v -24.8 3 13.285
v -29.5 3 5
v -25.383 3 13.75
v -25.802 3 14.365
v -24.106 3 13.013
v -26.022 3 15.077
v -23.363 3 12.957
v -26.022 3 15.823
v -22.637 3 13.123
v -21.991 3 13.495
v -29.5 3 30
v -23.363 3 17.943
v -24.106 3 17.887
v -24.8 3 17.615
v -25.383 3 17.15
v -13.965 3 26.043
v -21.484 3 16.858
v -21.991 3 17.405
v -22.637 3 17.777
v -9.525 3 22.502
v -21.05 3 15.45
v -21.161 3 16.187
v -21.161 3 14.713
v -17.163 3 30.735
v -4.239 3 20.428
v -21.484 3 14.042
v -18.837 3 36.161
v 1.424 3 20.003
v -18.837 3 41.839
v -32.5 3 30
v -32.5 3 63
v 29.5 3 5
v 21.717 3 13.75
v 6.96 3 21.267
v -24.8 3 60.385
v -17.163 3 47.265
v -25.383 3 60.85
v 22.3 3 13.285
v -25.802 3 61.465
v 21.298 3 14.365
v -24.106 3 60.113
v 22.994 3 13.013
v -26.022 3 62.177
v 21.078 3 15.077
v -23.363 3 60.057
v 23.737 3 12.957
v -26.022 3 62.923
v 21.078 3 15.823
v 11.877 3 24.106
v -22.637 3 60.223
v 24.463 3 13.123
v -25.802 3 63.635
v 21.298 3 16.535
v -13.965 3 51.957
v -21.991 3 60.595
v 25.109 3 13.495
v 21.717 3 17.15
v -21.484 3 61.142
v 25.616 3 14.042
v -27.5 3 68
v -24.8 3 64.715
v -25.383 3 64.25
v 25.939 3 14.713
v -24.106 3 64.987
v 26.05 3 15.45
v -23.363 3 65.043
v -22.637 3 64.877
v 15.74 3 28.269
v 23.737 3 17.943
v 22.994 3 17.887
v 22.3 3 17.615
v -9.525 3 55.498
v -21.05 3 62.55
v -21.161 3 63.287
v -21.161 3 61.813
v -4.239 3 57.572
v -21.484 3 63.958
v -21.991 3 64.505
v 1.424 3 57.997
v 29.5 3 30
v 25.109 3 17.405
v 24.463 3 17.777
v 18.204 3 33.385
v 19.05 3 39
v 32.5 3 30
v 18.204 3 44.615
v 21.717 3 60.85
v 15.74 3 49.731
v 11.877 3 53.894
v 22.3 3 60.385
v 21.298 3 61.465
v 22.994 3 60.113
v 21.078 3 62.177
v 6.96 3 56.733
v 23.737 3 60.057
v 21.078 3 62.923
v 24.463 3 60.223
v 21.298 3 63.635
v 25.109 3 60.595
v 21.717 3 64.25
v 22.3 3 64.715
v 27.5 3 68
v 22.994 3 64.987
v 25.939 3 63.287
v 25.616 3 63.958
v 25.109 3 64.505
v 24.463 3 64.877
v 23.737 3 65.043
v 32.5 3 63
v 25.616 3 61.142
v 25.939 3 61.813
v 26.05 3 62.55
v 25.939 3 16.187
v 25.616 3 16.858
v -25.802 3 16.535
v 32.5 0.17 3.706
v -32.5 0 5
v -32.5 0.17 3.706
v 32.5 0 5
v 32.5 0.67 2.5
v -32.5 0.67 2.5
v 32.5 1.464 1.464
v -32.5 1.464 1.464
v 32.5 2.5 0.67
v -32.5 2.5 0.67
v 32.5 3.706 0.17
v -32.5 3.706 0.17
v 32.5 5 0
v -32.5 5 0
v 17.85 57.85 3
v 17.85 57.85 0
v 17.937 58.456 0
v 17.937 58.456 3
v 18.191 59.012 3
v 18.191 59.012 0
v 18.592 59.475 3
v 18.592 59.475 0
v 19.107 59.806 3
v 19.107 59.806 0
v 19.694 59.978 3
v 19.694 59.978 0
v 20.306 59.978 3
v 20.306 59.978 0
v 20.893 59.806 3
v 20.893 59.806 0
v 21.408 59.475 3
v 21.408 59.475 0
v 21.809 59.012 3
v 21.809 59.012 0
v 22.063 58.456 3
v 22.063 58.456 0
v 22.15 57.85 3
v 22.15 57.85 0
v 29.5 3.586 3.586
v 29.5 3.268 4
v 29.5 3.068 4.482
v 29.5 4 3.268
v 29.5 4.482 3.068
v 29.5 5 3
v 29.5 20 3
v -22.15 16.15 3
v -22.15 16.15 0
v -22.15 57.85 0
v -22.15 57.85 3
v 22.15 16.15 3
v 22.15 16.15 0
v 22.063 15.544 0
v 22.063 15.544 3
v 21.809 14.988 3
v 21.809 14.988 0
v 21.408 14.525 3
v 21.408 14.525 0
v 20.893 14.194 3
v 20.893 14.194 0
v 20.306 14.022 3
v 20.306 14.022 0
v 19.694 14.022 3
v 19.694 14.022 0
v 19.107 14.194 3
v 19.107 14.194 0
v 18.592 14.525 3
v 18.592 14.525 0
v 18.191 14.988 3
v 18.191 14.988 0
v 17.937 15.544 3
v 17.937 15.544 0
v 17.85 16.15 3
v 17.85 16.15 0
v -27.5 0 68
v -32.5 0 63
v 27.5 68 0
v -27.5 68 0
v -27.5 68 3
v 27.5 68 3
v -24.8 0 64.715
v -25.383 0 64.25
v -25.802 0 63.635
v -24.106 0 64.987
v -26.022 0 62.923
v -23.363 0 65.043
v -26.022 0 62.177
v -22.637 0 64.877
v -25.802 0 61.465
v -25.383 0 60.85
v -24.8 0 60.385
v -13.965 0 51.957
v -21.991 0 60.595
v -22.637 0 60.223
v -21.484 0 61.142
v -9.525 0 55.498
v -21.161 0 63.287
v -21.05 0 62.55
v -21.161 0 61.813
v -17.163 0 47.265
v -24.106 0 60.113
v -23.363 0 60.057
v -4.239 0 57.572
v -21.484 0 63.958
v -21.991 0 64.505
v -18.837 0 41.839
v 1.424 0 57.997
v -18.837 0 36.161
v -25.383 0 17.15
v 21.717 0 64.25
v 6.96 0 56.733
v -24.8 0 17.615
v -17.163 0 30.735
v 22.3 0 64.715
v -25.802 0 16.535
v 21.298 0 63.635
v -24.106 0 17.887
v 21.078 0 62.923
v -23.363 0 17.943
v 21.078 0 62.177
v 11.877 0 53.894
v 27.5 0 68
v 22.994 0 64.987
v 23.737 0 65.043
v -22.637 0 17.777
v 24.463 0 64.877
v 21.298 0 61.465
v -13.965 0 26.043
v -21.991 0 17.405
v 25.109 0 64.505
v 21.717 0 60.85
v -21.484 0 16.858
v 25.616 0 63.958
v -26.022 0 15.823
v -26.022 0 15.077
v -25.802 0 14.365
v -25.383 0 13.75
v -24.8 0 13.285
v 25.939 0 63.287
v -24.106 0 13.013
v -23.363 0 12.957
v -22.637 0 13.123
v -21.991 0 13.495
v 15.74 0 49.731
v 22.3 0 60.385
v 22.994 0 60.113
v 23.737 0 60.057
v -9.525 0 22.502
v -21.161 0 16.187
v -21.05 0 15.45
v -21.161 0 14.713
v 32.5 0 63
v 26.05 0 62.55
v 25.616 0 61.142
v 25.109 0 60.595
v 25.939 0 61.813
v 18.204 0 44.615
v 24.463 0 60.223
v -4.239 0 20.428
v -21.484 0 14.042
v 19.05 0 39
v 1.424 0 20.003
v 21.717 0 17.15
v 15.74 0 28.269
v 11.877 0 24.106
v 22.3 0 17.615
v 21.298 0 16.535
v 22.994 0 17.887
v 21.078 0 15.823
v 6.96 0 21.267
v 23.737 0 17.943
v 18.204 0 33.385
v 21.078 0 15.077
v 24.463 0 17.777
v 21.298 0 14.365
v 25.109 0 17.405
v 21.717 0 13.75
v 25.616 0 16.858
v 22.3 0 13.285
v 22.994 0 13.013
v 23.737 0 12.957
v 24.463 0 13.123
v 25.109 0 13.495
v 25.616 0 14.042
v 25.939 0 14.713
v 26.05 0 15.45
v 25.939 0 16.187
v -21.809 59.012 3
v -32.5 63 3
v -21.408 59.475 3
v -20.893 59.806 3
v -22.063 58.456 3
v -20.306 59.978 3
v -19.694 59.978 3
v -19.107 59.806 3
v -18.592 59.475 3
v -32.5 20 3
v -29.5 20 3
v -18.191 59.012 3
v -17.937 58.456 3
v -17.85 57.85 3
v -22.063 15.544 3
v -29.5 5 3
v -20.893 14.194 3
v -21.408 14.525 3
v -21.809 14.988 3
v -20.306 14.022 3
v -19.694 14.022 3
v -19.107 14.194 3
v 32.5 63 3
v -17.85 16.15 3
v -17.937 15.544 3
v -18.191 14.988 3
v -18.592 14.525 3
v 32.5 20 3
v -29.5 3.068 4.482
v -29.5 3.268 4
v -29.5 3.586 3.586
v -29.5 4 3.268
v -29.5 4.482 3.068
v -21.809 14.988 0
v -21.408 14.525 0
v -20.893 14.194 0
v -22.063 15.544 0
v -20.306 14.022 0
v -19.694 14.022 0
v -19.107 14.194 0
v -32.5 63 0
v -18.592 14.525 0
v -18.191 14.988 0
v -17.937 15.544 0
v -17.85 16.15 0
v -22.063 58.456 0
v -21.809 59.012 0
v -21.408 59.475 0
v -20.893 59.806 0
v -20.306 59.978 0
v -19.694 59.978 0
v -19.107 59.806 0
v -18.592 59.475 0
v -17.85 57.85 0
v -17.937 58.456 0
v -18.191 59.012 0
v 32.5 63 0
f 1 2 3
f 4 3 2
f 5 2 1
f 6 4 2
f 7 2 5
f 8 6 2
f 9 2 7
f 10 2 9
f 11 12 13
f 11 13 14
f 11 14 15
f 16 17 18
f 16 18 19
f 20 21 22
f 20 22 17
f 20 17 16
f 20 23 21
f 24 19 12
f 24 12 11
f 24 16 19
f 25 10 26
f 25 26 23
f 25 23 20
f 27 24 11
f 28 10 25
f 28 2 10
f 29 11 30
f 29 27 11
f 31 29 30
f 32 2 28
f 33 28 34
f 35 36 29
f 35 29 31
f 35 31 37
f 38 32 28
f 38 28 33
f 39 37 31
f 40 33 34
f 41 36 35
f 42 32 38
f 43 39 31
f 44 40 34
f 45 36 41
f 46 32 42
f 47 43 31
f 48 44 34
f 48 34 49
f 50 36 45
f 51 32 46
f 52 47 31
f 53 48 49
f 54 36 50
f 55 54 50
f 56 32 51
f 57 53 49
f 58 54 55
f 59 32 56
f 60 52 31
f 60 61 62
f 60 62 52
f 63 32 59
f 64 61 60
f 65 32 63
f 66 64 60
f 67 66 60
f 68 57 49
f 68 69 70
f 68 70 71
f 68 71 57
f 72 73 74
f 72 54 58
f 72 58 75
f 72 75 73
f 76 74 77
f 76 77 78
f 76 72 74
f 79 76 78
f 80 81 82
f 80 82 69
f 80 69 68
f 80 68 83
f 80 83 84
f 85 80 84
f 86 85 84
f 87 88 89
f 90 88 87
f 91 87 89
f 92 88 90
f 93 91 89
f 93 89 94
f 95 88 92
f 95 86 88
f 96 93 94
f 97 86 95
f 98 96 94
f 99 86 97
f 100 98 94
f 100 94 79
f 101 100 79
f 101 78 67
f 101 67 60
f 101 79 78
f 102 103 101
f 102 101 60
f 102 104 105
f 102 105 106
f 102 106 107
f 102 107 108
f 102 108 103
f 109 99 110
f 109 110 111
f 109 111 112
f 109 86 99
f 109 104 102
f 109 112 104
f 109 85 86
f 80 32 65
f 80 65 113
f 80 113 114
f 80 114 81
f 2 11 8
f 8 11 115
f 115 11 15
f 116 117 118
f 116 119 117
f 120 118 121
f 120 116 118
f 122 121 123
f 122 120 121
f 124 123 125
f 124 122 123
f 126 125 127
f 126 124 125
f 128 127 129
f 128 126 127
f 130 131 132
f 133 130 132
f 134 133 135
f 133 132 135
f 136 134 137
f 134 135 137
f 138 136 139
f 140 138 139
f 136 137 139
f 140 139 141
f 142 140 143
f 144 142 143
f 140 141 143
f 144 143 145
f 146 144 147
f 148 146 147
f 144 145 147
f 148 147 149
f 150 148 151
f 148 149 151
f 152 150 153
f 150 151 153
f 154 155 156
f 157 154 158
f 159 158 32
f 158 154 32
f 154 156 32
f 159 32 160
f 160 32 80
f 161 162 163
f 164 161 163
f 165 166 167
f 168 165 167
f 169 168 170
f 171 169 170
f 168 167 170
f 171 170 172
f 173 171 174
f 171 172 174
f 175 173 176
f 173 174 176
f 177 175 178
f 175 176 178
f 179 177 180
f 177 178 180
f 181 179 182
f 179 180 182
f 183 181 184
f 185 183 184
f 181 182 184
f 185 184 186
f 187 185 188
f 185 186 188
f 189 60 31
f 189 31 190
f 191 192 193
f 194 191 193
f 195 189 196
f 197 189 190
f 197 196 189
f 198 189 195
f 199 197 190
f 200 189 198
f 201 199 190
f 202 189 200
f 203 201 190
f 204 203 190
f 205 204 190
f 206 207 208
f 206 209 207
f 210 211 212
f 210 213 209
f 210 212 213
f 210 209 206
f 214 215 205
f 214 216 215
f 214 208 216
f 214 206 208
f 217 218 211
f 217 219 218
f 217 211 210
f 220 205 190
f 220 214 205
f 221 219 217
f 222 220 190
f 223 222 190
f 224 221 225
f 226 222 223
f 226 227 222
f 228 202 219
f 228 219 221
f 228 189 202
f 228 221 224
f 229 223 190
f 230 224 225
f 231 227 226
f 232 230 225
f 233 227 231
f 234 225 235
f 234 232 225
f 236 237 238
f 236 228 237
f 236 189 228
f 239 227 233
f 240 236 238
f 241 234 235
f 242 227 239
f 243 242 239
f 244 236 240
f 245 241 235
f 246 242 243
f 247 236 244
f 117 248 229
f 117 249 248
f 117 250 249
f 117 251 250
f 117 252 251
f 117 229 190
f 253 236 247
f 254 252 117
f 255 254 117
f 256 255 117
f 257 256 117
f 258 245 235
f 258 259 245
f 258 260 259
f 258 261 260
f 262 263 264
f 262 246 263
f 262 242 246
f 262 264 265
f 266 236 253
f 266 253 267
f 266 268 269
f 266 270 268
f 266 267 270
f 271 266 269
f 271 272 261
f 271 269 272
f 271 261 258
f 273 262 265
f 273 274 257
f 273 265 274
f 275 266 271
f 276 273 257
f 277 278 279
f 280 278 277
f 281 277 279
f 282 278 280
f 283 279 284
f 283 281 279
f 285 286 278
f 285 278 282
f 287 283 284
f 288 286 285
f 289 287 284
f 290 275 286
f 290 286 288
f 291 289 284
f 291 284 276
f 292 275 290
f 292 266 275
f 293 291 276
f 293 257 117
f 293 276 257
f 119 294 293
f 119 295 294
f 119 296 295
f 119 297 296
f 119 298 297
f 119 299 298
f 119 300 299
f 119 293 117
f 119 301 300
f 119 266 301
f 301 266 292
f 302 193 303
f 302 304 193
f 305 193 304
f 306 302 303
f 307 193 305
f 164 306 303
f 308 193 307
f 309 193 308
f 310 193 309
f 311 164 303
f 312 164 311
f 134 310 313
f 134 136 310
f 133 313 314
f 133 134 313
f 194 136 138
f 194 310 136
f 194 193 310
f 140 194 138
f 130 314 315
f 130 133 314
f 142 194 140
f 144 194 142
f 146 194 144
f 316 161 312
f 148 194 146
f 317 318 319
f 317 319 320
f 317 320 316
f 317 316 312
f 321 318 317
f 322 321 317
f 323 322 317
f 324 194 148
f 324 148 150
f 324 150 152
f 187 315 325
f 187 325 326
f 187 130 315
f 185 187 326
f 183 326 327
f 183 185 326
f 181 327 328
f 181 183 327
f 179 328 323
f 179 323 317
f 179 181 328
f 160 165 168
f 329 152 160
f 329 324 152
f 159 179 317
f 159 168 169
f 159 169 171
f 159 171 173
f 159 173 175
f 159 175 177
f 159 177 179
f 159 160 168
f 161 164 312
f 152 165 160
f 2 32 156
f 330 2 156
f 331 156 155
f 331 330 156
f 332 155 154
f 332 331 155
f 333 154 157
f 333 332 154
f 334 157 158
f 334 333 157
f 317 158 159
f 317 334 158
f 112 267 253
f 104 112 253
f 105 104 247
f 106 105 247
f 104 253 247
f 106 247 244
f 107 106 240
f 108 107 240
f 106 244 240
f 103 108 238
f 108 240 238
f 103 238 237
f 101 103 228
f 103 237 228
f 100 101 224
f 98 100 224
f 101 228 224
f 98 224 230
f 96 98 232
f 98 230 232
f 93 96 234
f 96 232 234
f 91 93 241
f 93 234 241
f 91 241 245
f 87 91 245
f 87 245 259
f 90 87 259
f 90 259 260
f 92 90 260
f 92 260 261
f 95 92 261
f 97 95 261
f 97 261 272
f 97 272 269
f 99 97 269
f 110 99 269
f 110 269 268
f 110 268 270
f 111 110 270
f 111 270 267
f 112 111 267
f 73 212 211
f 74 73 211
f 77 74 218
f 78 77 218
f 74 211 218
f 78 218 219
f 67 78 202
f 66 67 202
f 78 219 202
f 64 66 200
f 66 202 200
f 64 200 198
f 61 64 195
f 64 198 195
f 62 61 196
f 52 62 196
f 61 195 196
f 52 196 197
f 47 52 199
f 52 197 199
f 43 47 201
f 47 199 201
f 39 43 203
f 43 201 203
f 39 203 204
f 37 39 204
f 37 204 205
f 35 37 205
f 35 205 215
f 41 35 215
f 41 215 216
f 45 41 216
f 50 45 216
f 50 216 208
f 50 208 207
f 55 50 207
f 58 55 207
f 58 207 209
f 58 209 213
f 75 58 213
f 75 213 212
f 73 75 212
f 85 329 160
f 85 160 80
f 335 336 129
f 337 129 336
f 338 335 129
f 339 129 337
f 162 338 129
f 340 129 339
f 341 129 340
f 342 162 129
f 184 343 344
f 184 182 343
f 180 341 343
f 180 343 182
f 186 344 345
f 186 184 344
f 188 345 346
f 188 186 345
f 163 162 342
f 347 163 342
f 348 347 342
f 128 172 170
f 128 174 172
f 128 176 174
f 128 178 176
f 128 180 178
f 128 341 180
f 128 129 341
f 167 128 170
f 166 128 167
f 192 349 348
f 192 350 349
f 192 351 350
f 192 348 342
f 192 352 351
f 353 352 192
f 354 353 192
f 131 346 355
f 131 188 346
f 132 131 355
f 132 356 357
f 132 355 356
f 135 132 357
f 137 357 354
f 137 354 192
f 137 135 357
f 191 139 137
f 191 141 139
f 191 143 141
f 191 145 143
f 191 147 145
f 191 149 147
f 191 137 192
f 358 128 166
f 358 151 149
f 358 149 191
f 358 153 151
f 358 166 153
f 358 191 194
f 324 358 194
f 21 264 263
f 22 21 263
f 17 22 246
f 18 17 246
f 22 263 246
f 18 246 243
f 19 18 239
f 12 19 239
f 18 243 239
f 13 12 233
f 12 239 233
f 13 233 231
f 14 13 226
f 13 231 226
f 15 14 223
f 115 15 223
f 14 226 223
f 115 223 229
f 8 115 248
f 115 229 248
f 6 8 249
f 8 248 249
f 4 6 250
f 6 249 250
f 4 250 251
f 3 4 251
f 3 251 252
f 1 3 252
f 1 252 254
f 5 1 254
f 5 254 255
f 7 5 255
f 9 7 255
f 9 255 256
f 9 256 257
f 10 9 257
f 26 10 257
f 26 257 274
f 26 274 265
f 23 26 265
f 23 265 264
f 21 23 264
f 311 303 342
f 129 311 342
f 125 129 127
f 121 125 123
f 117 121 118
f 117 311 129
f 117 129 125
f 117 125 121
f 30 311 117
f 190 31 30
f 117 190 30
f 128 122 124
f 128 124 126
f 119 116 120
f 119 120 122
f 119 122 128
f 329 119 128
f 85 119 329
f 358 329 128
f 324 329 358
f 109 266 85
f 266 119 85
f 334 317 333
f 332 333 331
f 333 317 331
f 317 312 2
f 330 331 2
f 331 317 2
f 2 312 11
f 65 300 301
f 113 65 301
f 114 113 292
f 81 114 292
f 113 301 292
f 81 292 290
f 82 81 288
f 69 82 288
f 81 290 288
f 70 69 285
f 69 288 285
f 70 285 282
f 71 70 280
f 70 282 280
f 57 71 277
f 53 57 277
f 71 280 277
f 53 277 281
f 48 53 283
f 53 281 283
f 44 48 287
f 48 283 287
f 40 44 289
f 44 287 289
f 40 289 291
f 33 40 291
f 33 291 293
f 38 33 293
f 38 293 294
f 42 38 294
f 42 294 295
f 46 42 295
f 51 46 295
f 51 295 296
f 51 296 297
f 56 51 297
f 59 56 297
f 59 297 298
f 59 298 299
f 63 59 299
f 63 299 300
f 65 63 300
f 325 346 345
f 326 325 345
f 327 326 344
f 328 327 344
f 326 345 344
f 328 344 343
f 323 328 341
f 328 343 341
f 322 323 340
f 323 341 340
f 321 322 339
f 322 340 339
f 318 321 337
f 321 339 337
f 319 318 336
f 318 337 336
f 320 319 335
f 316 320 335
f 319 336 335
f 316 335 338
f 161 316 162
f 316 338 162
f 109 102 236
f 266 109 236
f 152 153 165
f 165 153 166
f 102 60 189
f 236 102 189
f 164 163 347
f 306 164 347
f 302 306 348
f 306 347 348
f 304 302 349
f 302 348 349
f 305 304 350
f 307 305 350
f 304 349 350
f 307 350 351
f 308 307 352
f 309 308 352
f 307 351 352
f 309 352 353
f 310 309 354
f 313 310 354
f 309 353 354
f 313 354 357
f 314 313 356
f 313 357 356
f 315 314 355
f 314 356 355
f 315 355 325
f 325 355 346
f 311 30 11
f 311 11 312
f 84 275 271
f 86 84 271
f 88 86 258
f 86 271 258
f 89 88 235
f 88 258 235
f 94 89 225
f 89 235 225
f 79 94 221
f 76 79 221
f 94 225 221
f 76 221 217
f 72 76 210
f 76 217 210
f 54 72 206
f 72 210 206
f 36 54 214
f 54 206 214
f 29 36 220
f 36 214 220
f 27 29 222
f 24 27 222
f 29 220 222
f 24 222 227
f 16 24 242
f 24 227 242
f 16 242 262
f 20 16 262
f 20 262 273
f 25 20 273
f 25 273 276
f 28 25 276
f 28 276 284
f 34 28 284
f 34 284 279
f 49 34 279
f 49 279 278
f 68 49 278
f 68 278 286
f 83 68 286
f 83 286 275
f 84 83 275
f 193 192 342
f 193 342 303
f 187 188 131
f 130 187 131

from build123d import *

# Parameters (mm, degrees)
F1_DEPTH  = 32.5
F2_R      = 5
F3_R      = 2
F4_R      = 19.05
F4_R_2    = 2.5
F5_DEPTH  = 68.001
F7_DEPTH  = 68.001
F9_DEPTH  = 3
F11_DEPTH = 3
F12_SIZE  = 5


with BuildPart() as f1:
    # F0 (on Right) → F1 (new body, symmetric)
    with BuildSketch(Plane.YZ):
        Polygon((0, 68), (0, 0), (68, 0), (68, 3), (3, 3), (3, 68), align=None)
    extrude(amount=F1_DEPTH, both=True)

    # F2
    f2_edges = [f1.edges().sort_by_distance(p)[0] for p in [
        (0, 0, 0),
    ]]
    fillet(f2_edges, radius=F2_R)

    # F3
    f3_edges = [f1.edges().sort_by_distance(p)[0] for p in [
        (0, 3, 3),
    ]]
    fillet(f3_edges, radius=F3_R)

    # F4 (on face) → F5 (cut, through all)
    with BuildSketch(Plane.XZ):
        with Locations((0, 39)):
            Circle(F4_R)
        with Locations((-23.55, 15.45)):
            Circle(F4_R_2)
        with Locations((23.55, 15.45)):
            Circle(F4_R_2)
        with Locations((23.55, 62.55)):
            Circle(F4_R_2)
        with Locations((-23.55, 62.55)):
            Circle(F4_R_2)
    extrude(amount=-F5_DEPTH, mode=Mode.SUBTRACT)

    # F6 (on face) → F7 (cut, through all)
    with BuildSketch(Plane(origin=(0, 0, 0), x_dir=(1, 0, 0), z_dir=(0, 0, -1))):
        with BuildLine():
            ThreePointArc((-22.15, -57.85), (-20, -60), (-17.85, -57.85))
            Line((-17.85, -57.85), (-17.85, -16.15))
            ThreePointArc((-17.85, -16.15), (-20, -14), (-22.15, -16.15))
            Line((-22.15, -16.15), (-22.15, -57.85))
        make_face()
        with BuildLine():
            ThreePointArc((17.85, -57.85), (20, -60), (22.15, -57.85))
            Line((22.15, -57.85), (22.15, -16.15))
            ThreePointArc((22.15, -16.15), (20, -14), (17.85, -16.15))
            Line((17.85, -16.15), (17.85, -57.85))
        make_face()
    extrude(amount=-F7_DEPTH, mode=Mode.SUBTRACT)

    # F8 (on face) → F9 (join)
    with BuildSketch(Plane.YZ.offset(32.5)):
        with BuildLine():
            Line((3, 30), (3, 5))
            ThreePointArc((3, 5), (3.585786, 3.585786), (5, 3))
            Line((5, 3), (20, 3))
            Line((20, 3), (3, 30))
        make_face()
    extrude(amount=-F9_DEPTH)

    # F10 (on face) → F11 (join)
    with BuildSketch(Plane(origin=(-32.5, 0, 0), x_dir=(0, -1, 0), z_dir=(-1, 0, 0))):
        with BuildLine():
            Line((-3, 5), (-3, 30))
            Line((-3, 30), (-20, 3))
            Line((-20, 3), (-5, 3))
            ThreePointArc((-5, 3), (-3.585786, 3.585786), (-3, 5))
        make_face()
    extrude(amount=-F11_DEPTH)

    # F12
    f12_edges = [f1.edges().sort_by_distance(p)[0] for p in [
        (32.5, 1.5, 68),
        (32.5, 68, 1.5),
        (-32.5, 68, 1.5),
        (-32.5, 1.5, 68),
    ]]
    chamfer(f12_edges, length=F12_SIZE)


solid = f1.part
